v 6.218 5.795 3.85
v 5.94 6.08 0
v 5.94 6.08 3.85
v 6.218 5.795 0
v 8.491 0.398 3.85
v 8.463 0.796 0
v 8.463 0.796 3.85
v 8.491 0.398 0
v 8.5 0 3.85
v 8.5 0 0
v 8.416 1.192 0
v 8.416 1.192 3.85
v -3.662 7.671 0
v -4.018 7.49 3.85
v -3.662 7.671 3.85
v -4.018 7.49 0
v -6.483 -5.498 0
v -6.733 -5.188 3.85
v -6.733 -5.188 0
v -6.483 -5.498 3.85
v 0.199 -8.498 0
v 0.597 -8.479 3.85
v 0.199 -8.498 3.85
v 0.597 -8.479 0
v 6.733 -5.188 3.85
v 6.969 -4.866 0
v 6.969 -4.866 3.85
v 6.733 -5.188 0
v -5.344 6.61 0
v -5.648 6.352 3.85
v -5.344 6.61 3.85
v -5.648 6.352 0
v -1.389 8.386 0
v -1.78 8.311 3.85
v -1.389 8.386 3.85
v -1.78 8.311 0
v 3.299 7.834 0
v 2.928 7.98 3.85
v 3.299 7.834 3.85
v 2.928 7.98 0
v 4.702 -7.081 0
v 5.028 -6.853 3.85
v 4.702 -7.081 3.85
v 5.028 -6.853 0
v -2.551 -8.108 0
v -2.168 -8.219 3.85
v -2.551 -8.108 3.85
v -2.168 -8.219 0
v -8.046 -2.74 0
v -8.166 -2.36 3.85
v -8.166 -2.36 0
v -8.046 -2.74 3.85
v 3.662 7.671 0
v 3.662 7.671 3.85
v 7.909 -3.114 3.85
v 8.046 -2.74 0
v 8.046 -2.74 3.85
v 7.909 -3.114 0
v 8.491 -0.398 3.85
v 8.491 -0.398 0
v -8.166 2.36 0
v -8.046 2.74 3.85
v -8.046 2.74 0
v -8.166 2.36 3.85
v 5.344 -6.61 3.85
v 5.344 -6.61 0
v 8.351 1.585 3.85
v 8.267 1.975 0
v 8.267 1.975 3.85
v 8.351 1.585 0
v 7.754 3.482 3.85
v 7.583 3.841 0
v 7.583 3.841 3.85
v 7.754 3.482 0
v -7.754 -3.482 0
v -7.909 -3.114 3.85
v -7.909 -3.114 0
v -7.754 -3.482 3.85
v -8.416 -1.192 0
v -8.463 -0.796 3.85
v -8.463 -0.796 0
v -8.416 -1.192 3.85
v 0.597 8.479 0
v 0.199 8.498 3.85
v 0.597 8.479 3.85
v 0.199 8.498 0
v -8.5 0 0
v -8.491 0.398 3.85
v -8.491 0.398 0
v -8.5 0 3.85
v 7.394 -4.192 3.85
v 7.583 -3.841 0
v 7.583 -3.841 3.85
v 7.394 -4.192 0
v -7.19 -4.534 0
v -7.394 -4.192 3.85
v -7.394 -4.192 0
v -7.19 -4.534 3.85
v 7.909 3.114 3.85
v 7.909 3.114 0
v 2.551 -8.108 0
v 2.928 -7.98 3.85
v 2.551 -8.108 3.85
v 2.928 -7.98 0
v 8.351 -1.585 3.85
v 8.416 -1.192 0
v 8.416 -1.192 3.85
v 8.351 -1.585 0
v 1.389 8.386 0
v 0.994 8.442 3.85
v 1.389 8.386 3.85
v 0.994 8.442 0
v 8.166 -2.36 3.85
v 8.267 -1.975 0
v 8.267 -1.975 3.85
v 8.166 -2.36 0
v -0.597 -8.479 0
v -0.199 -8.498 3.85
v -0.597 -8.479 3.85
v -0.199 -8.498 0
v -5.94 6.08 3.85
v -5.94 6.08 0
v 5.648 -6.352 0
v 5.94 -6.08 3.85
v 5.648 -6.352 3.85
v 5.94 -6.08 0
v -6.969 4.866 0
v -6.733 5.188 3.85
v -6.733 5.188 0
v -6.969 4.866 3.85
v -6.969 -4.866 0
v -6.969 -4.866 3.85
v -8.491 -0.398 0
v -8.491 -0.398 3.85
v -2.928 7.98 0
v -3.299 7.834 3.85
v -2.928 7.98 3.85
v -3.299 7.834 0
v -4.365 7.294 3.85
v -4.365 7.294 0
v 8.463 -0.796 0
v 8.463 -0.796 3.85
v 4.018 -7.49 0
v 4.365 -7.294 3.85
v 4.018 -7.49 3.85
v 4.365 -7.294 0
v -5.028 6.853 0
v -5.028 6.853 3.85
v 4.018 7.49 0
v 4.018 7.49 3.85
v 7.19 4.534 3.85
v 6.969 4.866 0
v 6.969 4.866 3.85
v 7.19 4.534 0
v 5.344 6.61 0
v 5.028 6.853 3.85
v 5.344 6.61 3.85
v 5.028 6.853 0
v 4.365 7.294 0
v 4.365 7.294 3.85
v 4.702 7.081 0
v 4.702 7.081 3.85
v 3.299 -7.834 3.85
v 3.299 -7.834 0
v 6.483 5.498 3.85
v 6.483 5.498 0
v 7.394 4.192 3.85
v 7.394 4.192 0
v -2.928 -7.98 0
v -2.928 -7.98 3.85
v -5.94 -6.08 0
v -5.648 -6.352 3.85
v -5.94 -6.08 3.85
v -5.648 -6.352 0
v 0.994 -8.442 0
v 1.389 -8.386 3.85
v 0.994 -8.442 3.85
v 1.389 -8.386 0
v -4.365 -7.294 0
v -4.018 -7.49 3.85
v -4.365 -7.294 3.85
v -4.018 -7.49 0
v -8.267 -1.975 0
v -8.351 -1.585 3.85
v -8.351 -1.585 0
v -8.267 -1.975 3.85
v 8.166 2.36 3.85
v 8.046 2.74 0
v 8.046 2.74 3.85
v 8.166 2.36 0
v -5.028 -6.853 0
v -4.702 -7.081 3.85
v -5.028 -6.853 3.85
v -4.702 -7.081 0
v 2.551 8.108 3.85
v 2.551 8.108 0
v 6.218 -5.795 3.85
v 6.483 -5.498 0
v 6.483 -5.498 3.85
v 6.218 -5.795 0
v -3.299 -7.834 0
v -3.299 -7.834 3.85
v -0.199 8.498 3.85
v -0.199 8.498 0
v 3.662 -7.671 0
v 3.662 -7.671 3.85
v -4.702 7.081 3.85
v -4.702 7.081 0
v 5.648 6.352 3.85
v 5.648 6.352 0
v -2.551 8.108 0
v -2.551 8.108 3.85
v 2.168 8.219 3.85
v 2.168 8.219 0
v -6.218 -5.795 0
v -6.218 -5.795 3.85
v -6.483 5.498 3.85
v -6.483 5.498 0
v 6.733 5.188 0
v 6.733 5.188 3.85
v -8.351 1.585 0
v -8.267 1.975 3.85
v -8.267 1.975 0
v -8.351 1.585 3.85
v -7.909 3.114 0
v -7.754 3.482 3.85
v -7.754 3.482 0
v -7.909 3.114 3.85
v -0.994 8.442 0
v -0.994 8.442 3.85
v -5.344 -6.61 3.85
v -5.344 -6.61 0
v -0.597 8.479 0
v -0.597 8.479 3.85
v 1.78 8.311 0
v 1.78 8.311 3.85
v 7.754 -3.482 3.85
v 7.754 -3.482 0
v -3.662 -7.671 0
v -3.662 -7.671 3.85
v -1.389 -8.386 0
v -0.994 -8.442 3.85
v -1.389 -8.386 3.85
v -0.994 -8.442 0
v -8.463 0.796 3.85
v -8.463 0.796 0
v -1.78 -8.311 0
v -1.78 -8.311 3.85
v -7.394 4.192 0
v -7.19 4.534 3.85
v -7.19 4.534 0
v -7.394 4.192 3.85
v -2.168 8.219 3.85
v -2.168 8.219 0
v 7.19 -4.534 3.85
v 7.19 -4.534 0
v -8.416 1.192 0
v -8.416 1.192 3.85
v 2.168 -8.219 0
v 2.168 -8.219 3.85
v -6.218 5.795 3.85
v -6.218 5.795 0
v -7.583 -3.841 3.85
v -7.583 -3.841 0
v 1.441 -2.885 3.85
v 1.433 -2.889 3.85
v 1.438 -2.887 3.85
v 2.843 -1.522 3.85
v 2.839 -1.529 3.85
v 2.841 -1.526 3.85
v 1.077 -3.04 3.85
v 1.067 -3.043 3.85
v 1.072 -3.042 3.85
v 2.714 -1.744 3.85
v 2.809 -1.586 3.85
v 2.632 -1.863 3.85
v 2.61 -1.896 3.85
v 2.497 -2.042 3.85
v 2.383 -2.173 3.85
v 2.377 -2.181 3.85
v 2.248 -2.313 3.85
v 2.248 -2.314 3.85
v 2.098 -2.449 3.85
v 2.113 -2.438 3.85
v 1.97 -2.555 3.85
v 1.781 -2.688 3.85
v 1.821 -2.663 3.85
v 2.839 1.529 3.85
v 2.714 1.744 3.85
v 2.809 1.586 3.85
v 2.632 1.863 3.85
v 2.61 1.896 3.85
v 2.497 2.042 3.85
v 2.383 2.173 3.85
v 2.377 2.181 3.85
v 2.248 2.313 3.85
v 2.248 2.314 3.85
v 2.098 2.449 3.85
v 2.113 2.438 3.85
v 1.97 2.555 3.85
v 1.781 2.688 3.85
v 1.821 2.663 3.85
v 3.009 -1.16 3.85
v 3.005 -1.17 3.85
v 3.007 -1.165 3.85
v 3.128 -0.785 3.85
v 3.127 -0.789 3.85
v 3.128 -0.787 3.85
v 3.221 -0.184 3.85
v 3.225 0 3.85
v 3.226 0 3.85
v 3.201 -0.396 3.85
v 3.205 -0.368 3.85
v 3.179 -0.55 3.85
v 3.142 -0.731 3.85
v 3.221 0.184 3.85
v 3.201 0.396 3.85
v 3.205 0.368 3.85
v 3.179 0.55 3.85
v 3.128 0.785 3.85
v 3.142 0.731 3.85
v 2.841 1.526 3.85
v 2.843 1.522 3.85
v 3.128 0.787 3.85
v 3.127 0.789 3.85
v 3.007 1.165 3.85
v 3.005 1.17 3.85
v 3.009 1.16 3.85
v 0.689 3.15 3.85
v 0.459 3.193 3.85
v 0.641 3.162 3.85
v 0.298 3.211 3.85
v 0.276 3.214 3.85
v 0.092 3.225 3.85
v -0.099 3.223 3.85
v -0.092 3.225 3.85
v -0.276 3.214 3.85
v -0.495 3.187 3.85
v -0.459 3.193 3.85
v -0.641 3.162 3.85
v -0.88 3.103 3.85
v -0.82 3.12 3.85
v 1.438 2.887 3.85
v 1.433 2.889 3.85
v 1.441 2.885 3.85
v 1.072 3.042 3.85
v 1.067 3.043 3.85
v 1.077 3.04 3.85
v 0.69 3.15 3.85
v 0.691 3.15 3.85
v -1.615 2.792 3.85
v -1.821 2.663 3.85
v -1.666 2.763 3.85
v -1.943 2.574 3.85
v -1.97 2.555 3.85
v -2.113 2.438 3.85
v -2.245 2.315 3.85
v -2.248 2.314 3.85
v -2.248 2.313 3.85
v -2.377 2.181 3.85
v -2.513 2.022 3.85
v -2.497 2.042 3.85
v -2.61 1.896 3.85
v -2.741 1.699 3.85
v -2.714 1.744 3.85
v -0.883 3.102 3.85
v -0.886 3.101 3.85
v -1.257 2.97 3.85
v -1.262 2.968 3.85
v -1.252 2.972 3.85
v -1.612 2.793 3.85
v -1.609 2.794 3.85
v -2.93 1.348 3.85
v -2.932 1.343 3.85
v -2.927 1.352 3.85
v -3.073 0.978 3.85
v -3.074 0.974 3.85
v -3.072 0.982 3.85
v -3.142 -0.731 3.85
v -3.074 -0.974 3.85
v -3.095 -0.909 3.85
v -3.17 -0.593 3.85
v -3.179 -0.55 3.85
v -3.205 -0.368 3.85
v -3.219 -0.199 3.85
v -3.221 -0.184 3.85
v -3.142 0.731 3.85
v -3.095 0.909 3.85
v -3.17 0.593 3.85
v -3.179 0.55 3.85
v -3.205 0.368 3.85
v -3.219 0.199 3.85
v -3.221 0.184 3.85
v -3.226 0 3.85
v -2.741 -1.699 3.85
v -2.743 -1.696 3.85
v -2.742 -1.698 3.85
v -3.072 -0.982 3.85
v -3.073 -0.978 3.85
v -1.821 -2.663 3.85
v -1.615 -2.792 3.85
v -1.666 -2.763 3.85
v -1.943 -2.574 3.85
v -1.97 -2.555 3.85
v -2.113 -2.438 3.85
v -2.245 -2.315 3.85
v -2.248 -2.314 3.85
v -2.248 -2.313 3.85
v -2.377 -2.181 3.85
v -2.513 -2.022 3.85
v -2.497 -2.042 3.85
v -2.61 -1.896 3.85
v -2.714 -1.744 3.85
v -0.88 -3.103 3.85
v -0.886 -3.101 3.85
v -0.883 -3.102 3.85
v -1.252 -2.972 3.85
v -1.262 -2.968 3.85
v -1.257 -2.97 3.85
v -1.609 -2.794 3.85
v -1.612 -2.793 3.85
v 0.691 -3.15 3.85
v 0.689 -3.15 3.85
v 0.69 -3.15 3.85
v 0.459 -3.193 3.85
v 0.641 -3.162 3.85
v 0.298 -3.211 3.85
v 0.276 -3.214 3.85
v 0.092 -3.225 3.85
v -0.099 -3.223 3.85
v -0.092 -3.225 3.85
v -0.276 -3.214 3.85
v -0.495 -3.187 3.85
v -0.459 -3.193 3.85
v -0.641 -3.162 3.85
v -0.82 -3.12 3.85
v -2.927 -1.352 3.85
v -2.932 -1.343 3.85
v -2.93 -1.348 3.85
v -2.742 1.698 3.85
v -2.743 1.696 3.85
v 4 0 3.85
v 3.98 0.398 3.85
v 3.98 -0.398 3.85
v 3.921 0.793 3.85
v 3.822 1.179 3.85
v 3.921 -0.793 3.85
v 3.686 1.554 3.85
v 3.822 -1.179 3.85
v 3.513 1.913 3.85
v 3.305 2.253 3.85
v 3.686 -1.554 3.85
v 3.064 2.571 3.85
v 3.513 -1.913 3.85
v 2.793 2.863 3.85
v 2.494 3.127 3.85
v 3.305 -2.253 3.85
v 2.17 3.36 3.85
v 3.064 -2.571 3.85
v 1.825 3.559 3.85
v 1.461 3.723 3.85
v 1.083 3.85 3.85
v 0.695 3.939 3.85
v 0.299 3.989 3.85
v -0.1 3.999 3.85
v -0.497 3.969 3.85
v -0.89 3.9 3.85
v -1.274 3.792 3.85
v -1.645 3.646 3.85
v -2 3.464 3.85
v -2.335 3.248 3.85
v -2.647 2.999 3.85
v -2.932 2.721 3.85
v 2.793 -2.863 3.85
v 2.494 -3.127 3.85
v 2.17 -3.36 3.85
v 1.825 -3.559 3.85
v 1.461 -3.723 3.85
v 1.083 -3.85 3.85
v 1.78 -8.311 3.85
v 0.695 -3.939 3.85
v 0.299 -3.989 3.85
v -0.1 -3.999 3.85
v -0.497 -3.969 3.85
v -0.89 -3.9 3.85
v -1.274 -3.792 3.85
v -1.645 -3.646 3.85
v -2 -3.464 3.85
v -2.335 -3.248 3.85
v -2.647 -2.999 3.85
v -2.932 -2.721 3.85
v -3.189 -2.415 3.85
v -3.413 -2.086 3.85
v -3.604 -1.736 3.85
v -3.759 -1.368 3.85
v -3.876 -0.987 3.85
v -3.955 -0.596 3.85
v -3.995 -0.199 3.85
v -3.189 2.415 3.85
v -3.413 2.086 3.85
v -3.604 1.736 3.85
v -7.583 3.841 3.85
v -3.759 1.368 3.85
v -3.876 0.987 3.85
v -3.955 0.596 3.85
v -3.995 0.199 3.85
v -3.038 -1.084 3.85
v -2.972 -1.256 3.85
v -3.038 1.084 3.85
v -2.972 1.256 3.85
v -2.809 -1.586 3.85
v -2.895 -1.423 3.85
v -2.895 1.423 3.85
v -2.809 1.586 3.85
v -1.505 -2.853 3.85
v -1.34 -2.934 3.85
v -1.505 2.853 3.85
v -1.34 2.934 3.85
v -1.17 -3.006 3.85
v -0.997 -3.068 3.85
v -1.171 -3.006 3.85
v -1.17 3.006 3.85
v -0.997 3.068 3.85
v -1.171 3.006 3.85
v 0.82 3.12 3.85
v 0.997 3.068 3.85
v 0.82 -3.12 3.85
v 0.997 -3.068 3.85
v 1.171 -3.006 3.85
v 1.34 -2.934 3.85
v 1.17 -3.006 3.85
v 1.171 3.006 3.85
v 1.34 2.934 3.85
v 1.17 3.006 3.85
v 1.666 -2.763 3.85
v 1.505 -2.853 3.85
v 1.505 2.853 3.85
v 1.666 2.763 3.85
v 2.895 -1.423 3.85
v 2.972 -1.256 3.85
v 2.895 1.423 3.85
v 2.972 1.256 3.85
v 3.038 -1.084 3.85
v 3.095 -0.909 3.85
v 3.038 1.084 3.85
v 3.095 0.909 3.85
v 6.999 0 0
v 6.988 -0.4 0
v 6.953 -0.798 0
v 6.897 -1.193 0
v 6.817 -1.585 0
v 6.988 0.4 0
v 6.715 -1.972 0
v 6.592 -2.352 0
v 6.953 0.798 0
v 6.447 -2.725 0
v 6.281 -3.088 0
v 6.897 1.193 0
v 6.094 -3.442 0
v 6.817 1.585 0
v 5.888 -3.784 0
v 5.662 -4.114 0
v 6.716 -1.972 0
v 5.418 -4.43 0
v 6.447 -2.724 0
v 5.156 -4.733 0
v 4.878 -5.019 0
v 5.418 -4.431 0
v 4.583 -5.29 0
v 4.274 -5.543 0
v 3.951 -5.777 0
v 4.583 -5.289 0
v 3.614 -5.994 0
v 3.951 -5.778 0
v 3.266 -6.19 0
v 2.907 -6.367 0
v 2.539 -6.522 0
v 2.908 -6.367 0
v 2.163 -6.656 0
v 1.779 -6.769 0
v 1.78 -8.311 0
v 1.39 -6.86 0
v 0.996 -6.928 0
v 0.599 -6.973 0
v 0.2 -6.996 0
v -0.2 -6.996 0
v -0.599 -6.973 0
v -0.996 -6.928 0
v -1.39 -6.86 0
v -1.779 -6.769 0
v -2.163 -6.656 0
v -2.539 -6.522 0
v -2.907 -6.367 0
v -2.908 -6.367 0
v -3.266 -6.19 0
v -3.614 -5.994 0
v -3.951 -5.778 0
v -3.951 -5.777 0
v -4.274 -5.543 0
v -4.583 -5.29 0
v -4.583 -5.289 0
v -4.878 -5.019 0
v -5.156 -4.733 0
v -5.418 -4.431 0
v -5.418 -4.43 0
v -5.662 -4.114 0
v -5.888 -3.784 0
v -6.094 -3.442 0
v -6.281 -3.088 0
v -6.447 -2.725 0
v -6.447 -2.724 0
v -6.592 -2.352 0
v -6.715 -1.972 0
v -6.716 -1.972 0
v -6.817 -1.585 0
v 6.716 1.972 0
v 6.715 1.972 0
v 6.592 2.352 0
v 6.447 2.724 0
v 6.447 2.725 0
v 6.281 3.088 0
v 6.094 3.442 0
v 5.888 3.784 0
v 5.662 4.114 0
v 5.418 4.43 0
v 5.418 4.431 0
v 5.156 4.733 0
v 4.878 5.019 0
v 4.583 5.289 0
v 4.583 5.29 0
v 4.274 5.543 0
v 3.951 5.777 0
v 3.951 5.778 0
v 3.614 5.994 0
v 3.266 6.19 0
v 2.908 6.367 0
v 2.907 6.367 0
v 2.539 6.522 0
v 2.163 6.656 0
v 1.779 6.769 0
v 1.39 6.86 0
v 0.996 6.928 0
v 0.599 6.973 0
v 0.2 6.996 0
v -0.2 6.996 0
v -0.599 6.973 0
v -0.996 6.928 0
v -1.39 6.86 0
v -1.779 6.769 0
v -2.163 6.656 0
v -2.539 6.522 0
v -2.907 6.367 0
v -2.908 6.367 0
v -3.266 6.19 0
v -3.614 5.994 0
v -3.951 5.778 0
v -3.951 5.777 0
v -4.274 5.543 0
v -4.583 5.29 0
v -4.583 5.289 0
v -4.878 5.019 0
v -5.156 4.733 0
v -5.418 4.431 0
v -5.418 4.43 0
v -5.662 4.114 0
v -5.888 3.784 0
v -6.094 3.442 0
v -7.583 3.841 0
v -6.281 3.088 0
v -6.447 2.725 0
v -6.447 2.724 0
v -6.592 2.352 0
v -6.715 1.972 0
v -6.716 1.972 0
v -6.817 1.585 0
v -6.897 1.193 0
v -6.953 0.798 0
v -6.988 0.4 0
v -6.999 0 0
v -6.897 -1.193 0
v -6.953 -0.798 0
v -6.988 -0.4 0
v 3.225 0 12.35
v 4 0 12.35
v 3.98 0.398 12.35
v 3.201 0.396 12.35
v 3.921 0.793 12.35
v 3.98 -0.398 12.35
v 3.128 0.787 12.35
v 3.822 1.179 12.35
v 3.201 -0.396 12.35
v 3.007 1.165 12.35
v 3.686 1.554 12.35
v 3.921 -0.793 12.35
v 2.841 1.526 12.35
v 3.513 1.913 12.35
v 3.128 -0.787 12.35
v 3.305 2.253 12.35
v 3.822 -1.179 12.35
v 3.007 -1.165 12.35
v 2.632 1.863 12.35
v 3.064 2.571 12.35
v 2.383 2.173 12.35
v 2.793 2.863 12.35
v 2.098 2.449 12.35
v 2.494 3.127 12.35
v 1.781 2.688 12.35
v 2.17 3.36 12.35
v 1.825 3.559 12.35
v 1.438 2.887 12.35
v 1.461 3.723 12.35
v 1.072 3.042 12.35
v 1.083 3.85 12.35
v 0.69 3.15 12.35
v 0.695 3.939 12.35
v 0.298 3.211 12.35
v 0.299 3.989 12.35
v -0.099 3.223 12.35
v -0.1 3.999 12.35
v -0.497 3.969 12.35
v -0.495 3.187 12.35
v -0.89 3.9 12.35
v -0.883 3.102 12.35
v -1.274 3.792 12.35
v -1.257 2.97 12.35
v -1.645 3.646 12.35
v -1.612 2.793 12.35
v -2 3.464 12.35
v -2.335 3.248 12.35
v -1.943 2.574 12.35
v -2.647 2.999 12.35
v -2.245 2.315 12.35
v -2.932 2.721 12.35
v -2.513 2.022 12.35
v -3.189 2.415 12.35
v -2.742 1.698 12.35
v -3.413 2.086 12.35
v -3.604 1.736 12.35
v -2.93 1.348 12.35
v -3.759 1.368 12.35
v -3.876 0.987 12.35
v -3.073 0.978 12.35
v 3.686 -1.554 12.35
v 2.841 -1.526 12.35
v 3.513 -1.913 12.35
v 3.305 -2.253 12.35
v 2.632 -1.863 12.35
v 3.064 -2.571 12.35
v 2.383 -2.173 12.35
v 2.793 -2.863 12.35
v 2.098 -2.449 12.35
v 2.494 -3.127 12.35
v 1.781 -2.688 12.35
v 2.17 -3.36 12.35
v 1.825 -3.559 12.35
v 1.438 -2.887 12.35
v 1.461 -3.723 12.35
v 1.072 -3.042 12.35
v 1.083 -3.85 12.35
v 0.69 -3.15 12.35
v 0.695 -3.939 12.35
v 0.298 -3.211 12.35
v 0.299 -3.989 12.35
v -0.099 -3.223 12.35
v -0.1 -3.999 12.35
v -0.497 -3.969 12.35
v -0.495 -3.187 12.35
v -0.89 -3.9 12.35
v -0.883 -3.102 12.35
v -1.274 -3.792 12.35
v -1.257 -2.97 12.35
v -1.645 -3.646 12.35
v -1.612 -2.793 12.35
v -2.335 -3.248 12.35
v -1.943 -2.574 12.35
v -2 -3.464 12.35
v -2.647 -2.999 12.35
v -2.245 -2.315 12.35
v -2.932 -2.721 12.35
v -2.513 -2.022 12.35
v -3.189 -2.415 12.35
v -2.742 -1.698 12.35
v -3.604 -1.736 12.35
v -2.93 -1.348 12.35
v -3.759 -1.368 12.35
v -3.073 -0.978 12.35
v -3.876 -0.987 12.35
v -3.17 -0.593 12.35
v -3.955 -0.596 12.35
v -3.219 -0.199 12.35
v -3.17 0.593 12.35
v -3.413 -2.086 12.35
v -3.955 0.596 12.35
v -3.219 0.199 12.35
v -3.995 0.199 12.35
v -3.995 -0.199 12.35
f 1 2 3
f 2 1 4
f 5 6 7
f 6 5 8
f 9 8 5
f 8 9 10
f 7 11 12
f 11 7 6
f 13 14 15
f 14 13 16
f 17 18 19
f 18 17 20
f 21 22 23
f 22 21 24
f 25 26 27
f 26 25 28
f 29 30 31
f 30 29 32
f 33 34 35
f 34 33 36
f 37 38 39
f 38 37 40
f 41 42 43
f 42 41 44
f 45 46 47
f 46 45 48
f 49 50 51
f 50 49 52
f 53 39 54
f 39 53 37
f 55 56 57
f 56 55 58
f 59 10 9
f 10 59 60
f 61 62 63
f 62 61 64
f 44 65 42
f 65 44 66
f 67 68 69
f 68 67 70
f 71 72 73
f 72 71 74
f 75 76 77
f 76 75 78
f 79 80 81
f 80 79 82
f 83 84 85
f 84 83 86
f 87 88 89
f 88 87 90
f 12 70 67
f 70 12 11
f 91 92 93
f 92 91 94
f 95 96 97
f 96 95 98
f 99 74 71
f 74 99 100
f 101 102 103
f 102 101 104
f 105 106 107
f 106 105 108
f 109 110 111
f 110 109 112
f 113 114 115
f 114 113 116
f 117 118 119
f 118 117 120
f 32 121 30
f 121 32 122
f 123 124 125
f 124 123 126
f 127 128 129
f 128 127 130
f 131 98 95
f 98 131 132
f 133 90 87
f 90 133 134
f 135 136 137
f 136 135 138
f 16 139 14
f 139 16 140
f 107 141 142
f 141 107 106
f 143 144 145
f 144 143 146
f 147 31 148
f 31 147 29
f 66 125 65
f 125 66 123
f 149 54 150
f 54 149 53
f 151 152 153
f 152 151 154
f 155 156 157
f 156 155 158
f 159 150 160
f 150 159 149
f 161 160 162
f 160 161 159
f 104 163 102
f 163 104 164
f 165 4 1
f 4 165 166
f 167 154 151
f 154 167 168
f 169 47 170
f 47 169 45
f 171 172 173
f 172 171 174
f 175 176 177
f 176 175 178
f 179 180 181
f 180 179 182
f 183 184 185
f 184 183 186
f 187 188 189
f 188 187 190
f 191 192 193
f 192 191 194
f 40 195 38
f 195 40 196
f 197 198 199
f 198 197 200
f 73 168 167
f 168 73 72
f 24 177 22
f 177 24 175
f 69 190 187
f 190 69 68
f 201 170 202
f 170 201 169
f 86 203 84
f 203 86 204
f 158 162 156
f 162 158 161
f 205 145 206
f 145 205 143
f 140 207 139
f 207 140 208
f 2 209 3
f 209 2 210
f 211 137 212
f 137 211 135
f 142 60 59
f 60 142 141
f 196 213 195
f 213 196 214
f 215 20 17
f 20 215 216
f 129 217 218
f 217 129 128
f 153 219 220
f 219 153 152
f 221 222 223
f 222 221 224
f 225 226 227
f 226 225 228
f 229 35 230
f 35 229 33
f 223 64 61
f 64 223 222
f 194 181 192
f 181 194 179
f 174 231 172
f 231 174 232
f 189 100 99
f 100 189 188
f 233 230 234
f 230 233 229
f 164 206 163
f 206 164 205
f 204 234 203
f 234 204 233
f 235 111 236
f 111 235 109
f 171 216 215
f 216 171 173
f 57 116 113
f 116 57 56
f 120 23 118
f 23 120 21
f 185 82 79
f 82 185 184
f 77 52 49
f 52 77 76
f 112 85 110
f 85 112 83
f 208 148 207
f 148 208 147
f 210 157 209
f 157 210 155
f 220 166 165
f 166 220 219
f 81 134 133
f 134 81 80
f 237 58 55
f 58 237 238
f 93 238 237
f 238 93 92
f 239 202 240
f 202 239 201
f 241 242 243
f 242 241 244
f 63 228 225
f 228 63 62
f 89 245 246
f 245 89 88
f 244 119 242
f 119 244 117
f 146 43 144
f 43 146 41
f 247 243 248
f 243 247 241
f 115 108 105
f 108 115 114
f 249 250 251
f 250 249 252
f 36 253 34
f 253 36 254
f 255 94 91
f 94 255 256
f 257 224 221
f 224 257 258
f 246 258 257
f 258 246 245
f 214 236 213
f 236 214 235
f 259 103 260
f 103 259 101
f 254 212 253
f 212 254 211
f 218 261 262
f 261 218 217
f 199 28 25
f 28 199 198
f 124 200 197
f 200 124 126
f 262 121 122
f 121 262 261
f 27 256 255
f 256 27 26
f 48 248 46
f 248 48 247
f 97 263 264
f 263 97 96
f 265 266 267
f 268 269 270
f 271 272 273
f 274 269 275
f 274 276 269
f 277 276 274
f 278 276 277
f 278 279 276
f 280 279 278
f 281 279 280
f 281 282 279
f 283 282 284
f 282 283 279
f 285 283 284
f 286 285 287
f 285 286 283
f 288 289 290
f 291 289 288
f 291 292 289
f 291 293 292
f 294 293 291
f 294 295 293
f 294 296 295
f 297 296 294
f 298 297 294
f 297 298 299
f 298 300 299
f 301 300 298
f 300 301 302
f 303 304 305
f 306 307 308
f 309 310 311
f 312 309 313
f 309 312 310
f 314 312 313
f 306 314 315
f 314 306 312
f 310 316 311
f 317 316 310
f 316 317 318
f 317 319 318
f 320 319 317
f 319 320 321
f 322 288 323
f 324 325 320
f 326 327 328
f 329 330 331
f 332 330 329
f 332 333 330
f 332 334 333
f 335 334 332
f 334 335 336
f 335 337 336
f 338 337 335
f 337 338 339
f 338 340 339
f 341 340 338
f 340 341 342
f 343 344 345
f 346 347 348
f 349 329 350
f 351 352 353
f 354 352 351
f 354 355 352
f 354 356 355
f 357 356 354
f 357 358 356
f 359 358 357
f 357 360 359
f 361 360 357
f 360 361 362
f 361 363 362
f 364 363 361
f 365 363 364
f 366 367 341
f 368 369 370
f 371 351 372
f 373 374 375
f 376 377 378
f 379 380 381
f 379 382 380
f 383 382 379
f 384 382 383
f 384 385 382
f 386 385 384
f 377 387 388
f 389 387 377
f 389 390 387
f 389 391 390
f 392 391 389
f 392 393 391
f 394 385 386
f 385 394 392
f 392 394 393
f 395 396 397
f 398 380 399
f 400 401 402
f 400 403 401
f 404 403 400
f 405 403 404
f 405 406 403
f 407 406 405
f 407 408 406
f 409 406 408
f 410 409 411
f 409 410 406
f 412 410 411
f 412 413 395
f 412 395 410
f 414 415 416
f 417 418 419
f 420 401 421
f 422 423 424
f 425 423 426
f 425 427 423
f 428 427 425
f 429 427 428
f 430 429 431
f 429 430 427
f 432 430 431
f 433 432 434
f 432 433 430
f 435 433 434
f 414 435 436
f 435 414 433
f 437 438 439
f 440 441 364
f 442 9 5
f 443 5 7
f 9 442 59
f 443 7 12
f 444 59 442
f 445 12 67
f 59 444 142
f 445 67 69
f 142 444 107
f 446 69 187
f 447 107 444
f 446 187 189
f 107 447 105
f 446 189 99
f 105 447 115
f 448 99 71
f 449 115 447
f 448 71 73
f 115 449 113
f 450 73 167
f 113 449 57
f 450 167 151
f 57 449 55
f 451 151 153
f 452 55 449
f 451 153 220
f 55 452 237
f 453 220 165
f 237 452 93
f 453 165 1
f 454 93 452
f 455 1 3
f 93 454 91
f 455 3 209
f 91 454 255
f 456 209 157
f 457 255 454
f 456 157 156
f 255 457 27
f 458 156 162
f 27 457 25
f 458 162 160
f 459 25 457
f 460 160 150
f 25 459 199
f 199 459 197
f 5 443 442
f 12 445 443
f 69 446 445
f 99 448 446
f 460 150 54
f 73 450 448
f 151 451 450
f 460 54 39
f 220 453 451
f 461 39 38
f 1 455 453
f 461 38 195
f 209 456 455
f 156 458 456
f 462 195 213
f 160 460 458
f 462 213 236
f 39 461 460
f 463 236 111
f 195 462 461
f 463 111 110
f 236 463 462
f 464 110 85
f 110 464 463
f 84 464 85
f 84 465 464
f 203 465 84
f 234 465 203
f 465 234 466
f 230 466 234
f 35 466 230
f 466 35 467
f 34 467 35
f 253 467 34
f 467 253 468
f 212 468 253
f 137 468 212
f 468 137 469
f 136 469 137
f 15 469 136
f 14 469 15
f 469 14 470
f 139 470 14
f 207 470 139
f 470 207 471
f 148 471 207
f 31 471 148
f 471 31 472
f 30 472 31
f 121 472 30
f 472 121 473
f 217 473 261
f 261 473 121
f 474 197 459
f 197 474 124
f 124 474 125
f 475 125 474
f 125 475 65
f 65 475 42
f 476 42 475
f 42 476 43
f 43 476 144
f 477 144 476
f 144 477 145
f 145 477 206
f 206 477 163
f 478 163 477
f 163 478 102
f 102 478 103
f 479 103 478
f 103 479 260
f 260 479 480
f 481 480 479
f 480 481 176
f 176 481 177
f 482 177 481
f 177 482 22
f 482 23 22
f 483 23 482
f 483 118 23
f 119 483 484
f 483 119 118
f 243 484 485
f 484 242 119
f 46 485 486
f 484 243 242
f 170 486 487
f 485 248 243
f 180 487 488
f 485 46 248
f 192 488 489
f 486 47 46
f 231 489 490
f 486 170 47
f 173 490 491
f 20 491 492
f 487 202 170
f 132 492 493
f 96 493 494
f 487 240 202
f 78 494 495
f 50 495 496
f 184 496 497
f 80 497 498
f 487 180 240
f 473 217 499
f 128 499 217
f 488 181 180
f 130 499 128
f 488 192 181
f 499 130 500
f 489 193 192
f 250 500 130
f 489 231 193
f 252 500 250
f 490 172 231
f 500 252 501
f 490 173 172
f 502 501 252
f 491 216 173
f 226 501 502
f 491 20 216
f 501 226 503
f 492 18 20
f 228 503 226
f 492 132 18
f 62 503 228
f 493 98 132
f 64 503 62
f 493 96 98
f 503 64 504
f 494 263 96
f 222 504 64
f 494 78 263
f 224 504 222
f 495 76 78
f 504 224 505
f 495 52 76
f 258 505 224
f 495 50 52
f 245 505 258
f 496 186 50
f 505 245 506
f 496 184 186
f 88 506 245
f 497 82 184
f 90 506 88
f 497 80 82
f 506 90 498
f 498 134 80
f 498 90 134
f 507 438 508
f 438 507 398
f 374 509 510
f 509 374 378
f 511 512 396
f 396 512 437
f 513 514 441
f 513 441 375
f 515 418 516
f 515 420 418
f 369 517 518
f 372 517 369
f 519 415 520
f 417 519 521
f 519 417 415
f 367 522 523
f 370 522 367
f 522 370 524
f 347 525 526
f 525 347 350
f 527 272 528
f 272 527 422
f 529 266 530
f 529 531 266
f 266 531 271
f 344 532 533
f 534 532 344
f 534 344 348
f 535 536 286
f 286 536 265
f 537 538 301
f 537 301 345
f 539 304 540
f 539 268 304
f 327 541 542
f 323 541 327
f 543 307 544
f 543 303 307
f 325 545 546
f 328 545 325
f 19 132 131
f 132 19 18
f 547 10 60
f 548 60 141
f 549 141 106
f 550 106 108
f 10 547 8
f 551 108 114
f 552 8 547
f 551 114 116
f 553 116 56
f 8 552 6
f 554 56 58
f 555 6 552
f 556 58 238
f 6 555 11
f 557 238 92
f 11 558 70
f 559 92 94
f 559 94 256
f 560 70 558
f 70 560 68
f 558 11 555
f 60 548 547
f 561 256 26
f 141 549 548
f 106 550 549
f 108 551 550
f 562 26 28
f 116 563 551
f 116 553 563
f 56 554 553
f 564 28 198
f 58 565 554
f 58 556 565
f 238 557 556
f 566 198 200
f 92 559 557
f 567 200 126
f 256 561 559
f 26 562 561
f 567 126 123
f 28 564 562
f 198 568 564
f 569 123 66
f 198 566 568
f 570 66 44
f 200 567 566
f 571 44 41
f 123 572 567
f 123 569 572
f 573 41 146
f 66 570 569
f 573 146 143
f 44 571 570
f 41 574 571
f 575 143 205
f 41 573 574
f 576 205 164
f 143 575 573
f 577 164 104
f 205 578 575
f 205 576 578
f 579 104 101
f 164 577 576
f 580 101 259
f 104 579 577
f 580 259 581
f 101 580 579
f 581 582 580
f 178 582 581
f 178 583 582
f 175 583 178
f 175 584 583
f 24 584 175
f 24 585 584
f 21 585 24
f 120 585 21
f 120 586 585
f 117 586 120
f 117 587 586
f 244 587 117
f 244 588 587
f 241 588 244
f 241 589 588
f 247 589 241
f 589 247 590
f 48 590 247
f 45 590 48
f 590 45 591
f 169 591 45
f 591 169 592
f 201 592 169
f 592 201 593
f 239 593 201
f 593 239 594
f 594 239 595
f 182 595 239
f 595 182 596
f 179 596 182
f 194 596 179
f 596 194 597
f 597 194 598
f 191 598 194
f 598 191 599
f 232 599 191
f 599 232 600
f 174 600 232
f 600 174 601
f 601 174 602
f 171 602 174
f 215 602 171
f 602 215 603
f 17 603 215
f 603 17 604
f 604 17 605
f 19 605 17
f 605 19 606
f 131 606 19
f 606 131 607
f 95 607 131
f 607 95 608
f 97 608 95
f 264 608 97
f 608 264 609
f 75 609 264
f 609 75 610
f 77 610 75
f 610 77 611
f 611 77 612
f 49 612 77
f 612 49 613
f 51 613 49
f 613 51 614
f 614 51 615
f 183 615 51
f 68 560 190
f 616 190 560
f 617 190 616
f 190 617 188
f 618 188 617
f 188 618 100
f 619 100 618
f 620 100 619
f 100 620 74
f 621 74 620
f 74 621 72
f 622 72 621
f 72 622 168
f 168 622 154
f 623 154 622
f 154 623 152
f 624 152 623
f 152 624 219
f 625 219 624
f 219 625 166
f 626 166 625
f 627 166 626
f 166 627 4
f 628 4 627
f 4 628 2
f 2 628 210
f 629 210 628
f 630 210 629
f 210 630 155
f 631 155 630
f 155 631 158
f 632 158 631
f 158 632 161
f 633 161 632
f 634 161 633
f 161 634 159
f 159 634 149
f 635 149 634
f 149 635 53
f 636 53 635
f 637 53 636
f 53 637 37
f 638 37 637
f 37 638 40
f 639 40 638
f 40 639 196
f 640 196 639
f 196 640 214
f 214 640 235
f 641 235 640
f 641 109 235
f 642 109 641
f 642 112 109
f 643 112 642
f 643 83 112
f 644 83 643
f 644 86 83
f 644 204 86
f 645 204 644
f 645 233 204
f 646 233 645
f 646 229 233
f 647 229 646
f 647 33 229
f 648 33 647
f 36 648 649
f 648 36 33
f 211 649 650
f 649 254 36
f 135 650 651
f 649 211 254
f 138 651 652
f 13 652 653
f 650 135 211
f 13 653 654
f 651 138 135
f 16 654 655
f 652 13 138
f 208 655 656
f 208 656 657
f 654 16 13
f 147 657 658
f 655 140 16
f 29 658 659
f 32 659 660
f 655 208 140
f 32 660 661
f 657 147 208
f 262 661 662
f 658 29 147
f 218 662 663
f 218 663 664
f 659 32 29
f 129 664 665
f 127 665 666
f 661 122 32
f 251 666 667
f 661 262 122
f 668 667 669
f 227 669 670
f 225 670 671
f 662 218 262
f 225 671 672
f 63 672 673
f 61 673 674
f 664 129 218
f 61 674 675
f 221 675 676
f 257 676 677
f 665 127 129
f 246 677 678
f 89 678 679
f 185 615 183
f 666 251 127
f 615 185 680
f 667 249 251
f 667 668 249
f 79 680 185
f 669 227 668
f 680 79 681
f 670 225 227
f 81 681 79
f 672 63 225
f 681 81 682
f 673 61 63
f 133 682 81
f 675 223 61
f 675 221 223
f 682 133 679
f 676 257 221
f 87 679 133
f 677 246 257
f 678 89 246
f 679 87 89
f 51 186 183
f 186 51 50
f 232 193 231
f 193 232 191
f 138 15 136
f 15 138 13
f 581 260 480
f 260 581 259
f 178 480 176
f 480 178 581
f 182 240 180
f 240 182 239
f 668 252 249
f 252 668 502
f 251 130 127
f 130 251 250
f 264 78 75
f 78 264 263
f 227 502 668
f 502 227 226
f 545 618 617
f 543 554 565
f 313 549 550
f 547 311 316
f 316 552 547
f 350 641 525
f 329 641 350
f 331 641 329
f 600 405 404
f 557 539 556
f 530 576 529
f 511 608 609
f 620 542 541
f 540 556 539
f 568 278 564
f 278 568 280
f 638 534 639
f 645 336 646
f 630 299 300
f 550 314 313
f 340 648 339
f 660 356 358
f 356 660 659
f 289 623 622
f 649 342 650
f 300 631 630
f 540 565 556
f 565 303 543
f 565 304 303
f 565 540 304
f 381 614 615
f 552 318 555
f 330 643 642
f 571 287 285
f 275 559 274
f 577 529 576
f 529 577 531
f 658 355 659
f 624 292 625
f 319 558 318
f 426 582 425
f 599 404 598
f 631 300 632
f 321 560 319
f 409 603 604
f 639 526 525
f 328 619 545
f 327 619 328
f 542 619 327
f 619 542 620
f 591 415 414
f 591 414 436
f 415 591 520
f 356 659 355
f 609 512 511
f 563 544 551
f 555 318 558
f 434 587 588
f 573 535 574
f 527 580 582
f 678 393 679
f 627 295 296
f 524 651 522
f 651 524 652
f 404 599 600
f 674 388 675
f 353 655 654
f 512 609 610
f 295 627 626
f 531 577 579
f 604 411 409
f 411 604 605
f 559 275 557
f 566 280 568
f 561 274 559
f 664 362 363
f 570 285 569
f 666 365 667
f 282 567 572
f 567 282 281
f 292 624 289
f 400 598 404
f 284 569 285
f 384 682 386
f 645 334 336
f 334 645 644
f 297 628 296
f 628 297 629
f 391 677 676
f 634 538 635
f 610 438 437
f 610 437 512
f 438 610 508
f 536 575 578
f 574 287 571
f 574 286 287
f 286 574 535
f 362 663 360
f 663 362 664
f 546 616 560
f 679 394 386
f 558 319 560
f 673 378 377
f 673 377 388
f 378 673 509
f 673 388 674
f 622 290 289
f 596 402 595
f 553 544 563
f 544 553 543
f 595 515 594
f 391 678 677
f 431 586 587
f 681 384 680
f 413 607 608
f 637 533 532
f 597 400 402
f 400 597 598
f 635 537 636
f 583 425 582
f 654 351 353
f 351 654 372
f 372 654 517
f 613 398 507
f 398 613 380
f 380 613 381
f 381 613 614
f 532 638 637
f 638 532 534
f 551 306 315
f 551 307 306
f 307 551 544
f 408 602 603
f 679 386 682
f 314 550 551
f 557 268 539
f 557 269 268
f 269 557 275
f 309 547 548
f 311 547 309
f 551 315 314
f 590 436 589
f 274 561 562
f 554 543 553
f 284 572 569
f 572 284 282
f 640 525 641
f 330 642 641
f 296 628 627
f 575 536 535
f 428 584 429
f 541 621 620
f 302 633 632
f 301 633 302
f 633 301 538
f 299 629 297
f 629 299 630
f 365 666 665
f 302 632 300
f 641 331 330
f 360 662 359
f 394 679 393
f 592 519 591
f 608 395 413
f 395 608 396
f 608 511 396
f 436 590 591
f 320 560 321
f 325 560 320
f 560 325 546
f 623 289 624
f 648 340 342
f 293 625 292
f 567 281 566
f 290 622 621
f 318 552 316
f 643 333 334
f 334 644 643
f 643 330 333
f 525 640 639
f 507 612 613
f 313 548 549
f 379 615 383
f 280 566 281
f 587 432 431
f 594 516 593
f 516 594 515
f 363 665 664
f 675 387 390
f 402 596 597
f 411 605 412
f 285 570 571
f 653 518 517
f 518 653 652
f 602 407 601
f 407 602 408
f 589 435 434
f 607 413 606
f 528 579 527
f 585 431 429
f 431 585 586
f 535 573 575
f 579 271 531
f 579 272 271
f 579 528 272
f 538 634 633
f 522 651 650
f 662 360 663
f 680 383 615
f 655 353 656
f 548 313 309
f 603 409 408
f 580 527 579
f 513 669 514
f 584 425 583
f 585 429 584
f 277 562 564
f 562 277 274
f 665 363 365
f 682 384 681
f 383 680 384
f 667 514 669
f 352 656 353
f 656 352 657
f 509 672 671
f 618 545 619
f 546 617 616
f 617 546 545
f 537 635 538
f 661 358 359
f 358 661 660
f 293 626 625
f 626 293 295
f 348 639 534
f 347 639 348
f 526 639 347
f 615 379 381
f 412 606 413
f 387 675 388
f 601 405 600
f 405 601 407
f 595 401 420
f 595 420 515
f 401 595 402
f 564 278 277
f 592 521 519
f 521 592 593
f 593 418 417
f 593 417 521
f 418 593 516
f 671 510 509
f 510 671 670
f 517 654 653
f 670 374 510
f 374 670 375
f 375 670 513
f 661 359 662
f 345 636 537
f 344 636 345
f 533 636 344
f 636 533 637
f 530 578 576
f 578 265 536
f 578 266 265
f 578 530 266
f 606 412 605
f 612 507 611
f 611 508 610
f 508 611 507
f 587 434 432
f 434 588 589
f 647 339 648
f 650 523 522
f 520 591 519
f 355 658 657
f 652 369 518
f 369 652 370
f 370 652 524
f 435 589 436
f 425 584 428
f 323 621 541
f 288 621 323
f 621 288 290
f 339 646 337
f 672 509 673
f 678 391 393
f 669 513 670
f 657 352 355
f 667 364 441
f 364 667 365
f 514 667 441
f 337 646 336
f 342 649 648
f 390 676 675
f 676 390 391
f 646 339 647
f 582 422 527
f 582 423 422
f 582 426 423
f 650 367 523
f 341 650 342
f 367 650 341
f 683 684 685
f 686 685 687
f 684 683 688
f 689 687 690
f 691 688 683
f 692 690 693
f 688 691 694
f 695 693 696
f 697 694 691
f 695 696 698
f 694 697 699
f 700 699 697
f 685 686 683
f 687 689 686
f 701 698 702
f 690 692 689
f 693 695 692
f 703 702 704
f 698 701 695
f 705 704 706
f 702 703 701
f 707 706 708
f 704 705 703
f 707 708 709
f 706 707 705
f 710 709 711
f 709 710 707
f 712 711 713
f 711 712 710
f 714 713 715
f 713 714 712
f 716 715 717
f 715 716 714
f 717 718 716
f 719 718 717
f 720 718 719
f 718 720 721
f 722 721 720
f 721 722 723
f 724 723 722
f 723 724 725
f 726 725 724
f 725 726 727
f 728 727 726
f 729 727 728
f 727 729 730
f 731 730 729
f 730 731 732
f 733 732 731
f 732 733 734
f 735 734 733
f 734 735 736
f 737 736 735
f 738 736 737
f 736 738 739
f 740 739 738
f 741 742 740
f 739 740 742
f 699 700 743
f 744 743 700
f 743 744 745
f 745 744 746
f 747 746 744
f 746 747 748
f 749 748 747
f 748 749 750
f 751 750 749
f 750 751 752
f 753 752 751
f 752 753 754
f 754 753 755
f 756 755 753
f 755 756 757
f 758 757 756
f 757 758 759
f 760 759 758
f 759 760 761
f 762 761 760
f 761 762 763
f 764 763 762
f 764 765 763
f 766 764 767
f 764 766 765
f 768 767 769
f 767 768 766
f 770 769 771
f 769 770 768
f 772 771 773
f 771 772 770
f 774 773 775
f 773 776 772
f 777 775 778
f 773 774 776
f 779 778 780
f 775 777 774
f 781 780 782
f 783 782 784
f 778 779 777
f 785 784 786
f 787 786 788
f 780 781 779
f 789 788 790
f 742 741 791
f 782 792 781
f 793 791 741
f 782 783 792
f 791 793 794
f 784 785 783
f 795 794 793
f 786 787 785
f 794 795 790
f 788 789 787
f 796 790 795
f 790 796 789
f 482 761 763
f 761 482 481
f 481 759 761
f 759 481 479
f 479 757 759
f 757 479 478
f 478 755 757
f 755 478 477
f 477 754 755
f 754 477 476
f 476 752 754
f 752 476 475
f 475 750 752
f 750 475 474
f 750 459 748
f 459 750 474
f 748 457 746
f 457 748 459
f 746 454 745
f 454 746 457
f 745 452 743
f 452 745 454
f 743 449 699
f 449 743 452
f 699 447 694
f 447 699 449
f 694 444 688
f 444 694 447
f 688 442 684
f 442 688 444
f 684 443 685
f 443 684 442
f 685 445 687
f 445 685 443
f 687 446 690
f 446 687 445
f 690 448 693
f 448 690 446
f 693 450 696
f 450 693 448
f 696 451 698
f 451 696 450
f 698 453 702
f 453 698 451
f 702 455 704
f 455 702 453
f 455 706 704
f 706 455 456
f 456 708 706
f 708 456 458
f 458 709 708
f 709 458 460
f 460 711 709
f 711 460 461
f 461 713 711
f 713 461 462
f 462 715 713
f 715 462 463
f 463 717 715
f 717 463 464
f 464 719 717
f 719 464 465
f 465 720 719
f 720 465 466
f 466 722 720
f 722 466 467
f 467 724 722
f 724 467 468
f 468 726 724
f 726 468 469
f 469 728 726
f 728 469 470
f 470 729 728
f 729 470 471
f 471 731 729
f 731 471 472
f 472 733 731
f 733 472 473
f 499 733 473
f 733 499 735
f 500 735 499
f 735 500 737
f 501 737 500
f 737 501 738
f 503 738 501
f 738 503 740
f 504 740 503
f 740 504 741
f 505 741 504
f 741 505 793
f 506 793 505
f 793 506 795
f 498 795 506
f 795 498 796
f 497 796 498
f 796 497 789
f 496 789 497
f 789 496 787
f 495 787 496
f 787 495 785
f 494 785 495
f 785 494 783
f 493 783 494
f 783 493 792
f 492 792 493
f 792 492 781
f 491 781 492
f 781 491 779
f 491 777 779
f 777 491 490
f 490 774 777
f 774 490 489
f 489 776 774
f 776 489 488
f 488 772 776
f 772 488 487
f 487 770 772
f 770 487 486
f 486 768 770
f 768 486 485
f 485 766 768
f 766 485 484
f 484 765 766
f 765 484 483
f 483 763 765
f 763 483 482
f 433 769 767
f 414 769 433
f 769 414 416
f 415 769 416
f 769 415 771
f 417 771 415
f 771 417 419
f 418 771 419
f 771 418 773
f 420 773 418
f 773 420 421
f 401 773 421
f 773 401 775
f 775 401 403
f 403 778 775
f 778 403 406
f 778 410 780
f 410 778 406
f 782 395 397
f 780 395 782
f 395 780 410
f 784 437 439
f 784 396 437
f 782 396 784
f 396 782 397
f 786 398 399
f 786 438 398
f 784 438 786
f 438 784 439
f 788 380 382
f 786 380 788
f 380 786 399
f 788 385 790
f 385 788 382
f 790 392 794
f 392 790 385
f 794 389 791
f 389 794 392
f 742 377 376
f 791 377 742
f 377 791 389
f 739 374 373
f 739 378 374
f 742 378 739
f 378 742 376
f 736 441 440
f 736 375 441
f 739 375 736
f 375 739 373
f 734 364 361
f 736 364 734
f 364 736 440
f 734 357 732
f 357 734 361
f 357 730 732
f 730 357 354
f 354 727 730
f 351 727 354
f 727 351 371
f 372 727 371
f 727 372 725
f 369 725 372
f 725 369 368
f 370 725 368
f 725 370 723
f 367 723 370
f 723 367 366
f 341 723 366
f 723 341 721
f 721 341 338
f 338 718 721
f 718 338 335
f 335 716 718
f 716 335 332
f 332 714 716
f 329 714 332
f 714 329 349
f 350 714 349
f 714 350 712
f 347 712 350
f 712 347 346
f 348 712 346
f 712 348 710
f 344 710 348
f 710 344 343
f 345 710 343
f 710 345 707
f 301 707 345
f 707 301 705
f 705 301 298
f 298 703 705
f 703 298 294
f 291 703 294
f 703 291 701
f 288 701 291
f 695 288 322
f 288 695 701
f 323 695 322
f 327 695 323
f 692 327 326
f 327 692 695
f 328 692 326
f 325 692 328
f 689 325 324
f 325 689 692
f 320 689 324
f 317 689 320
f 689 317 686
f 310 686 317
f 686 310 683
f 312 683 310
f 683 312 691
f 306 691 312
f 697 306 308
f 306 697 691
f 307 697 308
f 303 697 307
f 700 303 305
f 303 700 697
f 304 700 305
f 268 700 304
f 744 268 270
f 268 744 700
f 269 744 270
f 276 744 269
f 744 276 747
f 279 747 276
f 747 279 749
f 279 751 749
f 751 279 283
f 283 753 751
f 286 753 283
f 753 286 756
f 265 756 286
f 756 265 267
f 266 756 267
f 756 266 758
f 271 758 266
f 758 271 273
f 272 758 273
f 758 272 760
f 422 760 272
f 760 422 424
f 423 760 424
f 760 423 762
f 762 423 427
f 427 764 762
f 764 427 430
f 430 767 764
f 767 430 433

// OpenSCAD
use <MCAD/2Dshapes.scad>

$fa = 1;
$fs = 0.4;

function in2mm(inches) = inches * 25.4;

BEARING_D = 8;
BEARING_H = 7;
BOLT_D = in2mm(1/4) + 0.1; // tolerance


WASHER_D = 17;
WASHER_IN_D = 8;
WASHER_H = 1.5;
module washer() {
    color("grey") linear_extrude(height=WASHER_H)
        donutSlice(WASHER_IN_D/2, WASHER_D/2, 0, 360);
}

module bearing_adapter() {
    h = BEARING_H + WASHER_H;
    linear_extrude(height=h) donutSlice(BOLT_D/2, BEARING_D/2, 0, 360);
}

HEAD_H = 3.85;
module head() {
    difference() {
        cylinder(d=WASHER_D, h=HEAD_H);
        translate([0, 0, -0.001]) cylinder(d1=14, d2=BOLT_D, h=HEAD_H+0.002);
    }
}

head();
//translate([0, 0, HEAD_H]) washer();
translate([0, 0, HEAD_H]) bearing_adapter();
